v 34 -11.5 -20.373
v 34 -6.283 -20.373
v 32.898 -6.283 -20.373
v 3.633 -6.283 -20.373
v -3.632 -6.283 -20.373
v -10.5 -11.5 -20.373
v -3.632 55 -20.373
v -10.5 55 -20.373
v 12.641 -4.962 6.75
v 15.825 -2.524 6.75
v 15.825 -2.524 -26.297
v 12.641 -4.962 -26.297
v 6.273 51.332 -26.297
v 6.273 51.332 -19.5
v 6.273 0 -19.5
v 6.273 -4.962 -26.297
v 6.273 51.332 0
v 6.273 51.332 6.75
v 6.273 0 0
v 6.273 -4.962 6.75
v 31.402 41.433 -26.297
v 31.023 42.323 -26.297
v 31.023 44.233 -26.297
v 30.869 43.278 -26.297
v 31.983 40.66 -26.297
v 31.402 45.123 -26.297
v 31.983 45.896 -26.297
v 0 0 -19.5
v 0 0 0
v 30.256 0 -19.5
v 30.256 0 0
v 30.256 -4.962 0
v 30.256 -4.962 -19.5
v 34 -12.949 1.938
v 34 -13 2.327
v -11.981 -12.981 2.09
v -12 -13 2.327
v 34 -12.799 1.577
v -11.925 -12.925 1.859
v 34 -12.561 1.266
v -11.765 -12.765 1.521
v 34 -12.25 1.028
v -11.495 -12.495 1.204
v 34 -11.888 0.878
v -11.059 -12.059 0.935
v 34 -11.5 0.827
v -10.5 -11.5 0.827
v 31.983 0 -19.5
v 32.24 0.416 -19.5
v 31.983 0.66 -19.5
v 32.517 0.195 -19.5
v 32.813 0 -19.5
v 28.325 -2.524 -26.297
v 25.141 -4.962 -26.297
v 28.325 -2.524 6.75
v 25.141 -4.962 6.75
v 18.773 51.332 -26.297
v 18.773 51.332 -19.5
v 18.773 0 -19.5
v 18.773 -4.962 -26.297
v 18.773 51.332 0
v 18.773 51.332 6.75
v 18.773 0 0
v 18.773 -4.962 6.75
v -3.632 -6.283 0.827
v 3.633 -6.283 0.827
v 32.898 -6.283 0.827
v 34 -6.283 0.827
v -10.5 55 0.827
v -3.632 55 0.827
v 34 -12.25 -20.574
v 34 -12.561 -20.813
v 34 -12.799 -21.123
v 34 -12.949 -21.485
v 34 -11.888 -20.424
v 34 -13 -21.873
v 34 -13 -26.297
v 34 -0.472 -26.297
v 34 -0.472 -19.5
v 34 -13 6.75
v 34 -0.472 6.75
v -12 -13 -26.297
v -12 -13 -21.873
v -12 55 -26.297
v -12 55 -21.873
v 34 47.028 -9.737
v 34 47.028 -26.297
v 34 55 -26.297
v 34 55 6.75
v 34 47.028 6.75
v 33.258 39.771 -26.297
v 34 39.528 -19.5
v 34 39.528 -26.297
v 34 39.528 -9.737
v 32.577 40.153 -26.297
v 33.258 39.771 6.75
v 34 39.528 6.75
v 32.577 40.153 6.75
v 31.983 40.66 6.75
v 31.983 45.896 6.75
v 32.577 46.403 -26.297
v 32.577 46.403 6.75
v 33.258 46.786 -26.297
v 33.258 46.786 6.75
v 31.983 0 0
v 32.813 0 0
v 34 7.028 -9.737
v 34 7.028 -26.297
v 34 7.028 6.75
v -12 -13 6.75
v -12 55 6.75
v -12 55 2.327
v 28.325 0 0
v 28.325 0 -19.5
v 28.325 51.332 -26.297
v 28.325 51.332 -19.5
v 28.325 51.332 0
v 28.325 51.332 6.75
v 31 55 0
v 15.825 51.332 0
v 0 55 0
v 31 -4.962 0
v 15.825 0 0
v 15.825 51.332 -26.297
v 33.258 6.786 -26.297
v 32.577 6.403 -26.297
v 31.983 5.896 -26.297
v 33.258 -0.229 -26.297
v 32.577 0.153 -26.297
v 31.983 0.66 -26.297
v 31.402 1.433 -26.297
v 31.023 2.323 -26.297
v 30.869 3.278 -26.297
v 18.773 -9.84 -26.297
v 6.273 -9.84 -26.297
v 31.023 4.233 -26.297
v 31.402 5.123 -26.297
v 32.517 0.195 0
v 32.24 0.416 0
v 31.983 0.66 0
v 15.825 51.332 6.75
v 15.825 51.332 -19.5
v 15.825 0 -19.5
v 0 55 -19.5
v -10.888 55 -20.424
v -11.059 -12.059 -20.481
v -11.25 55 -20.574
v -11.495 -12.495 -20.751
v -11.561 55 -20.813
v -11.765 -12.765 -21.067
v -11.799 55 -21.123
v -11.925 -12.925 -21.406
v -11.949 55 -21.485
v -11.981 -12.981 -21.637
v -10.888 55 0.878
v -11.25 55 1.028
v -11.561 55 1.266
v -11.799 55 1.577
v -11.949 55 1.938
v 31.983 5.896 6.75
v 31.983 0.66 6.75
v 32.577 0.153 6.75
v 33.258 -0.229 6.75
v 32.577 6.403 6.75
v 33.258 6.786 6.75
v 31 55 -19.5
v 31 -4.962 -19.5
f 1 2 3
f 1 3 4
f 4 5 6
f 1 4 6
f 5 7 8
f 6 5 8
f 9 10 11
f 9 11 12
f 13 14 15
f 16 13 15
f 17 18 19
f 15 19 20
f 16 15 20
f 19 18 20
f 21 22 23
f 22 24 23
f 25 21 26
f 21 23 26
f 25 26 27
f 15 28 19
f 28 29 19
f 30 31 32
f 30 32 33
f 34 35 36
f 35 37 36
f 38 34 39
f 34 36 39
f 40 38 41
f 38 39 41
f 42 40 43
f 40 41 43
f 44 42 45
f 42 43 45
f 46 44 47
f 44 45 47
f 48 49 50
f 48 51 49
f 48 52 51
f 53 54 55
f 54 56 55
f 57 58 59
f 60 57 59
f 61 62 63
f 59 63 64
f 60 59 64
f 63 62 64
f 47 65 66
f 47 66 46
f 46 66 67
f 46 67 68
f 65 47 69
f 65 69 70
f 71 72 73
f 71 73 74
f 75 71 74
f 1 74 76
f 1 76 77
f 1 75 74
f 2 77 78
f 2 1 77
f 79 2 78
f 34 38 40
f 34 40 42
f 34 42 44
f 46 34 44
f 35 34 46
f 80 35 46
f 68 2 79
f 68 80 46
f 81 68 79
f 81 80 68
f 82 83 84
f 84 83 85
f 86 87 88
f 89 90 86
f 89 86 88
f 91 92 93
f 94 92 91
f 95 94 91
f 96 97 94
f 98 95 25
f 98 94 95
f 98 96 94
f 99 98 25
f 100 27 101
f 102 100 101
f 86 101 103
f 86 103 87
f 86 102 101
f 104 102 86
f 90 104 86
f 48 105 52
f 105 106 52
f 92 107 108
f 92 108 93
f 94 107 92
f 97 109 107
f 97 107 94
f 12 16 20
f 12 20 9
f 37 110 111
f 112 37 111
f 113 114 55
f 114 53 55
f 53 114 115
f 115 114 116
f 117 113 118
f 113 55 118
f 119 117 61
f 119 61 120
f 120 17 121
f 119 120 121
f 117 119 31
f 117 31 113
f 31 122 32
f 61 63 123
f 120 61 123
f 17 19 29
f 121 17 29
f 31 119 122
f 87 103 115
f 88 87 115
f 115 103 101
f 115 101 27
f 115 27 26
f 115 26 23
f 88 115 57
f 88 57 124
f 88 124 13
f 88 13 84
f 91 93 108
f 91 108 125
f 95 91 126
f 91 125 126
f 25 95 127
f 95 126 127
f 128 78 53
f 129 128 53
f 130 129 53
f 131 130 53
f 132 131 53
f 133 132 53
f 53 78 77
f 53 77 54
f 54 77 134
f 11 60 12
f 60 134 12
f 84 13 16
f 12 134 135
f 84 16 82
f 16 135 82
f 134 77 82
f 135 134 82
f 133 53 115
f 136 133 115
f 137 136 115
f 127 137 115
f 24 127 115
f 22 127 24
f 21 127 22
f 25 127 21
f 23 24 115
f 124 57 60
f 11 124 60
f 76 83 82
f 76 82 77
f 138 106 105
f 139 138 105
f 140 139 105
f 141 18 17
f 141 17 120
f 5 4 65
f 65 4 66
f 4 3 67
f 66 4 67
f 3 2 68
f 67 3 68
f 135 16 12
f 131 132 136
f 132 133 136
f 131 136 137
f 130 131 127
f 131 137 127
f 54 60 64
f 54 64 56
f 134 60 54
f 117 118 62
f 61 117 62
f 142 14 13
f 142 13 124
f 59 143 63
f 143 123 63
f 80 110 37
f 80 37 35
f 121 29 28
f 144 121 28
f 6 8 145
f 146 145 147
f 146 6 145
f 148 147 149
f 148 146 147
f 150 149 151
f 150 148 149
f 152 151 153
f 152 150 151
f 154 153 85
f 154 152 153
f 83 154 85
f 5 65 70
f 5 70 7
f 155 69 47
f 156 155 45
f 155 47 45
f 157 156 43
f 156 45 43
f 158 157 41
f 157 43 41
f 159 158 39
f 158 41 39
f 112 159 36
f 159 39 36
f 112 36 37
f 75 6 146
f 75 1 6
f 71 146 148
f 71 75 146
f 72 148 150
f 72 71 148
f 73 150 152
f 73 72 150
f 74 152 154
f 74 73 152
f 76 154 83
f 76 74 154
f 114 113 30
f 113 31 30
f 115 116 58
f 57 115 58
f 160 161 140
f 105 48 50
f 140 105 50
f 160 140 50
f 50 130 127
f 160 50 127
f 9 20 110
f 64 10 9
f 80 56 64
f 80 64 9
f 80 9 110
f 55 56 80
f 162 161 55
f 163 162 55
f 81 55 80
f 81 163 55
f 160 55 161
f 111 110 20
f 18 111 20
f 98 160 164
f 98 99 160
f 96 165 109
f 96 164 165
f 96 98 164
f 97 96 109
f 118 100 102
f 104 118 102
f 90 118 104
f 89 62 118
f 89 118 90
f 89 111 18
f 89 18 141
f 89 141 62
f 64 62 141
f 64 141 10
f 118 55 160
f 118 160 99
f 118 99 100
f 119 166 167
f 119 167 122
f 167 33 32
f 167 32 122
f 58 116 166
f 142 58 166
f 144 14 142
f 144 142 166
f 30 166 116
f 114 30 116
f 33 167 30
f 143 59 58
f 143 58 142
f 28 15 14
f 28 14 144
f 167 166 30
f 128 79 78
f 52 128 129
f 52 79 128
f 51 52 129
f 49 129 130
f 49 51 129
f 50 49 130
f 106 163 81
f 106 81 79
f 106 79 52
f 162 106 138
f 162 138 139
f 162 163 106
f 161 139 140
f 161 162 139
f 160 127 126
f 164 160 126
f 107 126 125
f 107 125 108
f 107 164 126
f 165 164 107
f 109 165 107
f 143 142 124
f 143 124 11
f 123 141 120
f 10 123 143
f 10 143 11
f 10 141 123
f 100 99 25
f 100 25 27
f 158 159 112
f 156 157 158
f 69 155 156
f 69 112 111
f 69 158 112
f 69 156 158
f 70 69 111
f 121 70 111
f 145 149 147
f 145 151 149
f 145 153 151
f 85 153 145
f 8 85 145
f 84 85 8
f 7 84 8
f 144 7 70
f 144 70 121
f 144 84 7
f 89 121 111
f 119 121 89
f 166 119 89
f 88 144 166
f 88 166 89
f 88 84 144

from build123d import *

# Parameters (mm, degrees)
BOSS_EXTRUDE1_DEPTH = 55
SKETCH2_W           = 46
SKETCH2_H           = 13
BOSS_EXTRUDE2_DEPTH = 33.046593186
CUT_EXTRUDE1_DEPTH  = 77.370876735
SKETCH4_W           = 3
SKETCH4_H           = 21.2
CUT_EXTRUDE2_DEPTH  = 81.445701024
CUT_EXTRUDE5_DEPTH  = 55
BOSS_EXTRUDE3_START = -33.046593
SKETCH6_W           = 29.264894646
SKETCH6_H           = 6.300081486
BOSS_EXTRUDE3_DEPTH = 33.046593
SKETCH7_W           = 21.2
SKETCH7_H           = 6.716582595
CUT_EXTRUDE6_DEPTH  = 77.370876735
SKETCH8_W           = 3.134420474
SKETCH8_H           = 7.5
CUT_EXTRUDE7_DEPTH  = 55
FILLET1_R           = 4
BOSS_EXTRUDE4_START = -33.046593
SKETCH9_W           = 1.727441698
SKETCH9_H           = 54.56683481
BOSS_EXTRUDE4_DEPTH = 33.046593
SKETCH10_W          = 0.74410578
SKETCH10_H          = 19.5
CUT_EXTRUDE8_DEPTH  = 59.962432577
FILLET2_R           = 1.5


with BuildPart() as part:
    # Sketch1 → Boss-Extrude1 (new body)
    with BuildSketch(Plane(origin=(0, 0, 0), x_dir=(1, 0, 0), z_dir=(0, 1, 0))):
        Polygon((31, -3.75), (31, 0), (0, 0), (0, 19.5), (31, 19.5), (31, 23.296593186), (34, 23.296593186), (34, 26.296593186), (-12, 26.296593186), (-12, -6.75), (34, -6.75), (34, -3.75), align=None)
        Polygon((31, 9.75), (31, 0), (31, -3.75), (34, -3.75), (34, 23.296593186), (31, 23.296593186), (31, 19.5), align=None)
    extrude(amount=BOSS_EXTRUDE1_DEPTH)

    # Sketch2 → Boss-Extrude2 (add)
    with BuildSketch(Plane.XY.offset(6.75)):
        with Locations((11, -6.5)):
            Rectangle(SKETCH2_W, SKETCH2_H)
    extrude(amount=-BOSS_EXTRUDE2_DEPTH)

    # Sketch3 → Cut-Extrude1 (cut, through all)
    with BuildSketch(Plane(origin=(34, 0, 0), x_dir=(0, 0, -1), z_dir=(1, 0, 0))):
        Polygon((-0.826703407, -6.283417405), (-0.826703407, -13), (9.773296593, -13), (20.373296593, -13), (20.373296593, -6.283417405), align=None)
    extrude(amount=-CUT_EXTRUDE1_DEPTH, mode=Mode.SUBTRACT)

    # Sketch4 → Cut-Extrude2 (cut, through all)
    with BuildSketch(Plane(origin=(0, 55, 0), x_dir=(1, 0, 0), z_dir=(0, 1, 0))):
        with Locations((-5.132099024, 9.773296593)):
            Rectangle(SKETCH4_W, SKETCH4_H)
        Polygon((-12, 20.373296593), (-12, 9.773296593), (-12, -0.826703407), (-6.632099024, -0.826703407), (-6.632099024, 20.373296593), align=None)
    extrude(amount=-CUT_EXTRUDE2_DEPTH, mode=Mode.SUBTRACT)

    # Sketch5 → Cut-Extrude5 (cut)
    with BuildSketch(Plane.XY.offset(6.75)):
        Polygon((28.325224087, 51.33184393), (18.77348764, 51.33184393), (18.77348764, 44.015620269), (18.77348764, -9.839915018), (28.325224087, -2.523691356), align=None)
        Polygon((6.27348764, -9.839915018), (6.27348764, 44.015620269), (6.27348764, 51.33184393), (15.825224087, 51.33184393), (15.825224087, -2.523691356), align=None)
    extrude(amount=-CUT_EXTRUDE5_DEPTH, mode=Mode.SUBTRACT)

    # Sketch6 → Boss-Extrude3 (add)
    with BuildSketch(Plane.XY.offset(6.75).offset(BOSS_EXTRUDE3_START)):
        with Locations((18.265416553, -8.11247332)):
            Rectangle(SKETCH6_W, SKETCH6_H)
    extrude(amount=BOSS_EXTRUDE3_DEPTH)

    # Sketch7 → Cut-Extrude6 (cut, through all)
    with BuildSketch(Plane(origin=(34, 0, 0), x_dir=(0, 0, -1), z_dir=(1, 0, 0))):
        with Locations((9.773296593, -9.641708703)):
            Rectangle(SKETCH7_W, SKETCH7_H)
    extrude(amount=-CUT_EXTRUDE6_DEPTH, mode=Mode.SUBTRACT)

    # Sketch8 → Cut-Extrude7 (cut)
    with BuildSketch(Plane.XY.offset(6.75)):
        with Locations((32.432789763, 3.278045091)):
            Rectangle(SKETCH8_W, SKETCH8_H)
        with Locations((32.432789763, 43.278045091)):
            Rectangle(SKETCH8_W, SKETCH8_H)
    extrude(amount=-CUT_EXTRUDE7_DEPTH, mode=Mode.SUBTRACT)

    # Fillet1
    # the kernel refuses this fillet: 4 mm, written as the material it adds along each edge
    with BuildSketch(Plane(origin=(30.865579526, -0.471954909, 6.75), x_dir=(1, 0, 0), z_dir=(0, 0, -1))) as fillet1_piece_1_section:
        with BuildLine():
            CenterArc((4, -3.905223692), FILLET1_R, 102.497374798, 77.502625202)
            Line((0, -3.905223692), (-0.08, -3.905223692))
            Line((-0.08, -3.905223692), (-0.08, 0))
            Line((-0.08, 0), (0, 0.08))
            ThreePointArc((0, 0.08), (1.567210237, 0.08), (3.117108884, 0.078104474))
            Line((3.117108884, 0.078104474), (3.134420474, 0))
        make_face()
    fillet1_piece_1 = extrude(amount=33.046593186, mode=Mode.PRIVATE)
    fillet1_piece_1 = split(fillet1_piece_1, bisect_by=Plane(origin=(32.12921107, 0, 3.375), z_dir=(0, -1, 0)), keep=Keep.TOP, mode=Mode.PRIVATE)
    fillet1_piece_1 = split(fillet1_piece_1, bisect_by=Plane(origin=(32.12921107, -0.298742451, 0), z_dir=(0, 0, 1)), keep=Keep.TOP, mode=Mode.PRIVATE)
    add(fillet1_piece_1)
    with BuildSketch(Plane(origin=(30.865579526, -0.471954909, 6.75), x_dir=(1, 0, 0), z_dir=(0, 0, -1))) as fillet1_piece_2_section:
        with BuildLine():
            CenterArc((4, -3.905223692), FILLET1_R, 102.497374798, 77.502625202)
            Line((0, -3.905223692), (-0.08, -3.905223692))
            Line((-0.08, -3.905223692), (-0.08, 0))
            Line((-0.08, 0), (0, 0.08))
            ThreePointArc((0, 0.08), (1.567210237, 0.08), (3.117108884, 0.078104474))
            Line((3.117108884, 0.078104474), (3.134420474, 0))
        make_face()
    fillet1_piece_2 = extrude(amount=33.046593186, mode=Mode.PRIVATE)
    fillet1_piece_2 = split(fillet1_piece_2, bisect_by=Plane(origin=(31.341073978, 0, 3.375), z_dir=(0, 1, 0)), keep=Keep.TOP, mode=Mode.PRIVATE)
    fillet1_piece_2 = split(fillet1_piece_2, bisect_by=Plane(origin=(31.341073978, 0.922666131, 0), z_dir=(0, 0, 1)), keep=Keep.TOP, mode=Mode.PRIVATE)
    add(fillet1_piece_2)
    with BuildSketch(Plane(origin=(30.865579526, -0.471954909, 6.75), x_dir=(1, 0, 0), z_dir=(0, 0, -1))) as fillet1_piece_3_section:
        with BuildLine():
            CenterArc((4, -3.905223692), FILLET1_R, 102.497374798, 77.502625202)
            Line((0, -3.905223692), (-0.08, -3.905223692))
            Line((-0.08, -3.905223692), (-0.08, 0))
            Line((-0.08, 0), (0, 0.08))
            ThreePointArc((0, 0.08), (1.567210237, 0.08), (3.117108884, 0.078104474))
            Line((3.117108884, 0.078104474), (3.134420474, 0))
        make_face()
    fillet1_piece_3 = extrude(amount=33.046593186, mode=Mode.PRIVATE)
    fillet1_piece_3 = split(fillet1_piece_3, bisect_by=Plane(origin=(32.12921107, -0.298742451, -19.5), z_dir=(0, 0, 1)), keep=Keep.TOP, mode=Mode.PRIVATE)
    fillet1_piece_3 = split(fillet1_piece_3, bisect_by=Plane(origin=(32.12921107, 0, -9.75), z_dir=(0, -1, 0)), keep=Keep.TOP, mode=Mode.PRIVATE)
    fillet1_piece_3 = split(fillet1_piece_3, bisect_by=Plane(origin=(32.12921107, -0.298742451, 0), z_dir=(0, 0, -1)), keep=Keep.TOP, mode=Mode.PRIVATE)
    add(fillet1_piece_3)
    with BuildSketch(Plane(origin=(30.865579526, -0.471954909, 6.75), x_dir=(1, 0, 0), z_dir=(0, 0, -1))) as fillet1_piece_4_section:
        with BuildLine():
            CenterArc((4, -3.905223692), FILLET1_R, 102.497374798, 77.502625202)
            Line((0, -3.905223692), (-0.08, -3.905223692))
            Line((-0.08, -3.905223692), (-0.08, 0))
            Line((-0.08, 0), (0, 0.08))
            ThreePointArc((0, 0.08), (1.567210237, 0.08), (3.117108884, 0.078104474))
            Line((3.117108884, 0.078104474), (3.134420474, 0))
        make_face()
    fillet1_piece_4 = extrude(amount=33.046593186, mode=Mode.PRIVATE)
    fillet1_piece_4 = split(fillet1_piece_4, bisect_by=Plane(origin=(32.12921107, -0.298742451, -19.5), z_dir=(0, 0, -1)), keep=Keep.TOP, mode=Mode.PRIVATE)
    fillet1_piece_4 = split(fillet1_piece_4, bisect_by=Plane(origin=(32.12921107, 0, -22.898296593), z_dir=(0, -1, 0)), keep=Keep.TOP, mode=Mode.PRIVATE)
    add(fillet1_piece_4)
    with BuildSketch(Plane(origin=(30.865579526, -0.471954909, 6.75), x_dir=(1, 0, 0), z_dir=(0, 0, -1))) as fillet1_piece_5_section:
        with BuildLine():
            CenterArc((4, -3.905223692), FILLET1_R, 102.497374798, 77.502625202)
            Line((0, -3.905223692), (-0.08, -3.905223692))
            Line((-0.08, -3.905223692), (-0.08, 0))
            Line((-0.08, 0), (0, 0.08))
            ThreePointArc((0, 0.08), (1.567210237, 0.08), (3.117108884, 0.078104474))
            Line((3.117108884, 0.078104474), (3.134420474, 0))
        make_face()
    fillet1_piece_5 = extrude(amount=33.046593186, mode=Mode.PRIVATE)
    fillet1_piece_5 = split(fillet1_piece_5, bisect_by=Plane(origin=(31.341073978, 0.922666131, -19.5), z_dir=(0, 0, -1)), keep=Keep.TOP, mode=Mode.PRIVATE)
    fillet1_piece_5 = split(fillet1_piece_5, bisect_by=Plane(origin=(31.341073978, 0, -22.898296593), z_dir=(0, 1, 0)), keep=Keep.TOP, mode=Mode.PRIVATE)
    add(fillet1_piece_5)
    with BuildSketch(Plane(origin=(30.865579526, 7.028045091, -9.73694077), x_dir=(0, -1, 0), z_dir=(0, 0, -1))) as fillet1_piece_6_section:
        with BuildLine():
            CenterArc((3.905223692, -4), FILLET1_R, 90, 77.502625202)
            Line((0, -3.134420474), (-0.078104474, -3.117108884))
            ThreePointArc((-0.078104474, -3.117108884), (-0.08, -1.567210237), (-0.08, 0))
            Line((-0.08, 0), (0, 0.08))
            Line((0, 0.08), (3.905223692, 0.08))
            Line((3.905223692, 0.08), (3.905223692, 0))
        make_face()
    fillet1_piece_6 = extrude(amount=16.559652417, mode=Mode.PRIVATE)
    fillet1_piece_6 = split(fillet1_piece_6, bisect_by=Plane(origin=(31.850173209, 6.325117435, -19.5), z_dir=(0, 0, 1)), keep=Keep.TOP, mode=Mode.PRIVATE)
    fillet1_piece_6 = split(fillet1_piece_6, bisect_by=Plane(origin=(31, 6.325117435, -14.618470385), z_dir=(1, 0, 0)), keep=Keep.TOP, mode=Mode.PRIVATE)
    add(fillet1_piece_6)
    with BuildSketch(Plane(origin=(30.865579526, 7.028045091, -19.5), x_dir=(0, -1, 0), z_dir=(0, 0, -1))) as fillet1_piece_7_section:
        with BuildLine():
            CenterArc((3.905223692, -4), FILLET1_R, 90, 77.502625202)
            Line((0, -3.134420474), (-0.078104474, -3.117108884))
            ThreePointArc((-0.078104474, -3.117108884), (-0.08, -1.567210237), (-0.08, 0))
            Line((-0.08, 0), (0, 0.08))
            Line((0, 0.08), (3.905223692, 0.08))
            Line((3.905223692, 0.08), (3.905223692, 0))
        make_face()
    fillet1_piece_7 = extrude(amount=6.796593186, mode=Mode.PRIVATE)
    fillet1_piece_7 = split(fillet1_piece_7, bisect_by=Plane(origin=(31, 5.302848629, -22.898296593), z_dir=(-1, 0, 0)), keep=Keep.TOP, mode=Mode.PRIVATE)
    add(fillet1_piece_7)
    with BuildSketch(Plane(origin=(30.865579526, 7.028045091, -19.5), x_dir=(0, -1, 0), z_dir=(0, 0, -1))) as fillet1_piece_8_section:
        with BuildLine():
            CenterArc((3.905223692, -4), FILLET1_R, 90, 77.502625202)
            Line((0, -3.134420474), (-0.078104474, -3.117108884))
            ThreePointArc((-0.078104474, -3.117108884), (-0.08, -1.567210237), (-0.08, 0))
            Line((-0.08, 0), (0, 0.08))
            Line((0, 0.08), (3.905223692, 0.08))
            Line((3.905223692, 0.08), (3.905223692, 0))
        make_face()
    fillet1_piece_8 = extrude(amount=6.796593186, mode=Mode.PRIVATE)
    fillet1_piece_8 = split(fillet1_piece_8, bisect_by=Plane(origin=(31, 6.325117435, -22.898296593), z_dir=(1, 0, 0)), keep=Keep.TOP, mode=Mode.PRIVATE)
    add(fillet1_piece_8)
    with BuildSketch(Plane(origin=(30.865579526, 7.028045091, 6.75), x_dir=(0, -1, 0), z_dir=(0, 0, -1))) as fillet1_piece_9_section:
        with BuildLine():
            CenterArc((3.905223692, -4), FILLET1_R, 90, 77.502625202)
            Line((0, -3.134420474), (-0.078104474, -3.117108884))
            ThreePointArc((-0.078104474, -3.117108884), (-0.08, -1.567210237), (-0.08, 0))
            Line((-0.08, 0), (0, 0.08))
            Line((0, 0.08), (3.905223692, 0.08))
            Line((3.905223692, 0.08), (3.905223692, 0))
        make_face()
    fillet1_piece_9 = extrude(amount=6.75, mode=Mode.PRIVATE)
    fillet1_piece_9 = split(fillet1_piece_9, bisect_by=Plane(origin=(31, 5.302848629, 3.375), z_dir=(-1, 0, 0)), keep=Keep.TOP, mode=Mode.PRIVATE)
    add(fillet1_piece_9)
    with BuildSketch(Plane(origin=(30.865579526, 7.028045091, 6.75), x_dir=(0, -1, 0), z_dir=(0, 0, -1))) as fillet1_piece_10_section:
        with BuildLine():
            CenterArc((3.905223692, -4), FILLET1_R, 90, 77.502625202)
            Line((0, -3.134420474), (-0.078104474, -3.117108884))
            ThreePointArc((-0.078104474, -3.117108884), (-0.08, -1.567210237), (-0.08, 0))
            Line((-0.08, 0), (0, 0.08))
            Line((0, 0.08), (3.905223692, 0.08))
            Line((3.905223692, 0.08), (3.905223692, 0))
        make_face()
    fillet1_piece_10 = extrude(amount=6.75, mode=Mode.PRIVATE)
    fillet1_piece_10 = split(fillet1_piece_10, bisect_by=Plane(origin=(31, 6.325117435, 3.375), z_dir=(1, 0, 0)), keep=Keep.TOP, mode=Mode.PRIVATE)
    add(fillet1_piece_10)
    with BuildSketch(Plane(origin=(30.865579526, 7.028045091, 6.75), x_dir=(0, -1, 0), z_dir=(0, 0, -1))) as fillet1_piece_11_section:
        with BuildLine():
            CenterArc((3.905223692, -4), FILLET1_R, 90, 77.502625202)
            Line((0, -3.134420474), (-0.078104474, -3.117108884))
            ThreePointArc((-0.078104474, -3.117108884), (-0.08, -1.567210237), (-0.08, 0))
            Line((-0.08, 0), (0, 0.08))
            Line((0, 0.08), (3.905223692, 0.08))
            Line((3.905223692, 0.08), (3.905223692, 0))
        make_face()
    fillet1_piece_11 = extrude(amount=16.51305923, mode=Mode.PRIVATE)
    fillet1_piece_11 = split(fillet1_piece_11, bisect_by=Plane(origin=(31.850173209, 6.325117435, 0), z_dir=(0, 0, -1)), keep=Keep.TOP, mode=Mode.PRIVATE)
    fillet1_piece_11 = split(fillet1_piece_11, bisect_by=Plane(origin=(31, 6.325117435, -4.881529615), z_dir=(1, 0, 0)), keep=Keep.TOP, mode=Mode.PRIVATE)
    add(fillet1_piece_11)
    with BuildSketch(Plane(origin=(30.865579526, 47.028045091, -9.73694077), x_dir=(1, 0, 0), z_dir=(0, 0, -1))) as fillet1_piece_12_section:
        with BuildLine():
            CenterArc((4, 3.905223692), FILLET1_R, 180, 77.502625202)
            Line((0, 3.905223692), (-0.08, 3.905223692))
            Line((-0.08, 3.905223692), (-0.08, 0))
            Line((-0.08, 0), (0, -0.08))
            ThreePointArc((0, -0.08), (1.567210237, -0.08), (3.117108884, -0.078104474))
            Line((3.117108884, -0.078104474), (3.134420474, 0))
        make_face()
    fillet1_piece_12 = extrude(amount=16.559652417, mode=Mode.PRIVATE)
    fillet1_piece_12 = split(fillet1_piece_12, bisect_by=Plane(origin=(31, 46.325117435, -14.618470385), z_dir=(1, 0, 0)), keep=Keep.TOP, mode=Mode.PRIVATE)
    fillet1_piece_12 = split(fillet1_piece_12, bisect_by=Plane(origin=(31.850173209, 46.325117435, -19.5), z_dir=(0, 0, 1)), keep=Keep.TOP, mode=Mode.PRIVATE)
    add(fillet1_piece_12)
    with BuildSketch(Plane(origin=(30.865579526, 47.028045091, -19.5), x_dir=(1, 0, 0), z_dir=(0, 0, -1))) as fillet1_piece_13_section:
        with BuildLine():
            CenterArc((4, 3.905223692), FILLET1_R, 180, 77.502625202)
            Line((0, 3.905223692), (-0.08, 3.905223692))
            Line((-0.08, 3.905223692), (-0.08, 0))
            Line((-0.08, 0), (0, -0.08))
            ThreePointArc((0, -0.08), (1.567210237, -0.08), (3.117108884, -0.078104474))
            Line((3.117108884, -0.078104474), (3.134420474, 0))
        make_face()
    fillet1_piece_13 = extrude(amount=6.796593186, mode=Mode.PRIVATE)
    fillet1_piece_13 = split(fillet1_piece_13, bisect_by=Plane(origin=(31, 46.325117435, -22.898296593), z_dir=(1, 0, 0)), keep=Keep.TOP, mode=Mode.PRIVATE)
    add(fillet1_piece_13)
    with BuildSketch(Plane(origin=(30.865579526, 47.028045091, -19.5), x_dir=(1, 0, 0), z_dir=(0, 0, -1))) as fillet1_piece_14_section:
        with BuildLine():
            CenterArc((4, 3.905223692), FILLET1_R, 180, 77.502625202)
            Line((0, 3.905223692), (-0.08, 3.905223692))
            Line((-0.08, 3.905223692), (-0.08, 0))
            Line((-0.08, 0), (0, -0.08))
            ThreePointArc((0, -0.08), (1.567210237, -0.08), (3.117108884, -0.078104474))
            Line((3.117108884, -0.078104474), (3.134420474, 0))
        make_face()
    fillet1_piece_14 = extrude(amount=6.796593186, mode=Mode.PRIVATE)
    fillet1_piece_14 = split(fillet1_piece_14, bisect_by=Plane(origin=(31, 45.302848629, -22.898296593), z_dir=(-1, 0, 0)), keep=Keep.TOP, mode=Mode.PRIVATE)
    add(fillet1_piece_14)
    with BuildSketch(Plane(origin=(30.865579526, 47.028045091, 6.75), x_dir=(0, -1, 0), z_dir=(0, 0, -1))) as fillet1_piece_15_section:
        with BuildLine():
            CenterArc((3.905223692, -4), FILLET1_R, 90, 77.502625202)
            Line((0, -3.134420474), (-0.078104474, -3.117108884))
            ThreePointArc((-0.078104474, -3.117108884), (-0.08, -1.567210237), (-0.08, 0))
            Line((-0.08, 0), (0, 0.08))
            Line((0, 0.08), (3.905223692, 0.08))
            Line((3.905223692, 0.08), (3.905223692, 0))
        make_face()
    fillet1_piece_15 = extrude(amount=6.75, mode=Mode.PRIVATE)
    fillet1_piece_15 = split(fillet1_piece_15, bisect_by=Plane(origin=(31, 45.302848629, 3.375), z_dir=(-1, 0, 0)), keep=Keep.TOP, mode=Mode.PRIVATE)
    add(fillet1_piece_15)
    with BuildSketch(Plane(origin=(30.865579526, 47.028045091, 6.75), x_dir=(0, -1, 0), z_dir=(0, 0, -1))) as fillet1_piece_16_section:
        with BuildLine():
            CenterArc((3.905223692, -4), FILLET1_R, 90, 77.502625202)
            Line((0, -3.134420474), (-0.078104474, -3.117108884))
            ThreePointArc((-0.078104474, -3.117108884), (-0.08, -1.567210237), (-0.08, 0))
            Line((-0.08, 0), (0, 0.08))
            Line((0, 0.08), (3.905223692, 0.08))
            Line((3.905223692, 0.08), (3.905223692, 0))
        make_face()
    fillet1_piece_16 = extrude(amount=6.75, mode=Mode.PRIVATE)
    fillet1_piece_16 = split(fillet1_piece_16, bisect_by=Plane(origin=(31, 46.325117435, 3.375), z_dir=(1, 0, 0)), keep=Keep.TOP, mode=Mode.PRIVATE)
    add(fillet1_piece_16)
    with BuildSketch(Plane(origin=(30.865579526, 47.028045091, 6.75), x_dir=(0, -1, 0), z_dir=(0, 0, -1))) as fillet1_piece_17_section:
        with BuildLine():
            CenterArc((3.905223692, -4), FILLET1_R, 90, 77.502625202)
            Line((0, -3.134420474), (-0.078104474, -3.117108884))
            ThreePointArc((-0.078104474, -3.117108884), (-0.08, -1.567210237), (-0.08, 0))
            Line((-0.08, 0), (0, 0.08))
            Line((0, 0.08), (3.905223692, 0.08))
            Line((3.905223692, 0.08), (3.905223692, 0))
        make_face()
    fillet1_piece_17 = extrude(amount=16.51305923, mode=Mode.PRIVATE)
    fillet1_piece_17 = split(fillet1_piece_17, bisect_by=Plane(origin=(31.850173209, 46.325117435, 0), z_dir=(0, 0, -1)), keep=Keep.TOP, mode=Mode.PRIVATE)
    fillet1_piece_17 = split(fillet1_piece_17, bisect_by=Plane(origin=(31, 46.325117435, -4.881529615), z_dir=(1, 0, 0)), keep=Keep.TOP, mode=Mode.PRIVATE)
    add(fillet1_piece_17)
    with BuildSketch(Plane(origin=(30.865579526, 39.528045091, -9.73694077), x_dir=(1, 0, 0), z_dir=(0, 0, -1))) as fillet1_piece_18_section:
        with BuildLine():
            CenterArc((4, -3.905223692), FILLET1_R, 102.497374798, 77.502625202)
            Line((0, -3.905223692), (-0.08, -3.905223692))
            Line((-0.08, -3.905223692), (-0.08, 0))
            Line((-0.08, 0), (0, 0.08))
            ThreePointArc((0, 0.08), (1.567210237, 0.08), (3.117108884, 0.078104474))
            Line((3.117108884, 0.078104474), (3.134420474, 0))
        make_face()
    fillet1_piece_18 = extrude(amount=16.559652417, mode=Mode.PRIVATE)
    fillet1_piece_18 = split(fillet1_piece_18, bisect_by=Plane(origin=(31.850173209, 40.230972746, -19.5), z_dir=(0, 0, 1)), keep=Keep.TOP, mode=Mode.PRIVATE)
    fillet1_piece_18 = split(fillet1_piece_18, bisect_by=Plane(origin=(31, 40.230972746, -14.618470385), z_dir=(1, 0, 0)), keep=Keep.TOP, mode=Mode.PRIVATE)
    add(fillet1_piece_18)
    with BuildSketch(Plane(origin=(30.865579526, 39.528045091, -19.5), x_dir=(1, 0, 0), z_dir=(0, 0, -1))) as fillet1_piece_19_section:
        with BuildLine():
            CenterArc((4, -3.905223692), FILLET1_R, 102.497374798, 77.502625202)
            Line((0, -3.905223692), (-0.08, -3.905223692))
            Line((-0.08, -3.905223692), (-0.08, 0))
            Line((-0.08, 0), (0, 0.08))
            ThreePointArc((0, 0.08), (1.567210237, 0.08), (3.117108884, 0.078104474))
            Line((3.117108884, 0.078104474), (3.134420474, 0))
        make_face()
    fillet1_piece_19 = extrude(amount=6.796593186, mode=Mode.PRIVATE)
    fillet1_piece_19 = split(fillet1_piece_19, bisect_by=Plane(origin=(31, 40.230972746, -22.898296593), z_dir=(1, 0, 0)), keep=Keep.TOP, mode=Mode.PRIVATE)
    add(fillet1_piece_19)
    with BuildSketch(Plane(origin=(30.865579526, 39.528045091, -19.5), x_dir=(1, 0, 0), z_dir=(0, 0, -1))) as fillet1_piece_20_section:
        with BuildLine():
            CenterArc((4, -3.905223692), FILLET1_R, 102.497374798, 77.502625202)
            Line((0, -3.905223692), (-0.08, -3.905223692))
            Line((-0.08, -3.905223692), (-0.08, 0))
            Line((-0.08, 0), (0, 0.08))
            ThreePointArc((0, 0.08), (1.567210237, 0.08), (3.117108884, 0.078104474))
            Line((3.117108884, 0.078104474), (3.134420474, 0))
        make_face()
    fillet1_piece_20 = extrude(amount=6.796593186, mode=Mode.PRIVATE)
    fillet1_piece_20 = split(fillet1_piece_20, bisect_by=Plane(origin=(31, 41.253241553, -22.898296593), z_dir=(-1, 0, 0)), keep=Keep.TOP, mode=Mode.PRIVATE)
    add(fillet1_piece_20)
    with BuildSketch(Plane(origin=(30.865579526, 39.528045091, 6.75), x_dir=(1, 0, 0), z_dir=(0, 0, -1))) as fillet1_piece_21_section:
        with BuildLine():
            CenterArc((4, -3.905223692), FILLET1_R, 102.497374798, 77.502625202)
            Line((0, -3.905223692), (-0.08, -3.905223692))
            Line((-0.08, -3.905223692), (-0.08, 0))
            Line((-0.08, 0), (0, 0.08))
            ThreePointArc((0, 0.08), (1.567210237, 0.08), (3.117108884, 0.078104474))
            Line((3.117108884, 0.078104474), (3.134420474, 0))
        make_face()
    fillet1_piece_21 = extrude(amount=6.75, mode=Mode.PRIVATE)
    fillet1_piece_21 = split(fillet1_piece_21, bisect_by=Plane(origin=(31, 40.230972746, 3.375), z_dir=(1, 0, 0)), keep=Keep.TOP, mode=Mode.PRIVATE)
    add(fillet1_piece_21)
    with BuildSketch(Plane(origin=(30.865579526, 39.528045091, 6.75), x_dir=(1, 0, 0), z_dir=(0, 0, -1))) as fillet1_piece_22_section:
        with BuildLine():
            CenterArc((4, -3.905223692), FILLET1_R, 102.497374798, 77.502625202)
            Line((0, -3.905223692), (-0.08, -3.905223692))
            Line((-0.08, -3.905223692), (-0.08, 0))
            Line((-0.08, 0), (0, 0.08))
            ThreePointArc((0, 0.08), (1.567210237, 0.08), (3.117108884, 0.078104474))
            Line((3.117108884, 0.078104474), (3.134420474, 0))
        make_face()
    fillet1_piece_22 = extrude(amount=6.75, mode=Mode.PRIVATE)
    fillet1_piece_22 = split(fillet1_piece_22, bisect_by=Plane(origin=(31, 41.253241553, 3.375), z_dir=(-1, 0, 0)), keep=Keep.TOP, mode=Mode.PRIVATE)
    add(fillet1_piece_22)
    with BuildSketch(Plane(origin=(30.865579526, 39.528045091, 6.75), x_dir=(1, 0, 0), z_dir=(0, 0, -1))) as fillet1_piece_23_section:
        with BuildLine():
            CenterArc((4, -3.905223692), FILLET1_R, 102.497374798, 77.502625202)
            Line((0, -3.905223692), (-0.08, -3.905223692))
            Line((-0.08, -3.905223692), (-0.08, 0))
            Line((-0.08, 0), (0, 0.08))
            ThreePointArc((0, 0.08), (1.567210237, 0.08), (3.117108884, 0.078104474))
            Line((3.117108884, 0.078104474), (3.134420474, 0))
        make_face()
    fillet1_piece_23 = extrude(amount=16.51305923, mode=Mode.PRIVATE)
    fillet1_piece_23 = split(fillet1_piece_23, bisect_by=Plane(origin=(31, 40.230972746, -4.881529615), z_dir=(1, 0, 0)), keep=Keep.TOP, mode=Mode.PRIVATE)
    fillet1_piece_23 = split(fillet1_piece_23, bisect_by=Plane(origin=(31.850173209, 40.230972746, 0), z_dir=(0, 0, -1)), keep=Keep.TOP, mode=Mode.PRIVATE)
    add(fillet1_piece_23)

    # Sketch9 → Boss-Extrude4 (add)
    with BuildSketch(Plane.XY.offset(6.75).offset(BOSS_EXTRUDE4_START)):
        with Locations((31.119615069, 23.133898568)):
            Rectangle(SKETCH9_W, SKETCH9_H)
    extrude(amount=BOSS_EXTRUDE4_DEPTH)

    # Sketch10 → Cut-Extrude8 (cut)
    with BuildSketch(Plane(origin=(0, 55, 0), x_dir=(1, 0, 0), z_dir=(0, 1, 0))):
        with Locations((30.62794711, 9.75)):
            Rectangle(SKETCH10_W, SKETCH10_H)
    extrude(amount=-CUT_EXTRUDE8_DEPTH, mode=Mode.SUBTRACT)

    # Fillet2
    fillet2_edges = [part.edges().sort_by_distance(p)[0] for p in [
        (-12, 21, -20.373296593),
        (11, -13, -20.373296593),
        (-12, 21, 0.826703407),
        (11, -13, 0.826703407),
    ]]
    fillet(fillet2_edges, radius=FILLET2_R)


solid = part.part
